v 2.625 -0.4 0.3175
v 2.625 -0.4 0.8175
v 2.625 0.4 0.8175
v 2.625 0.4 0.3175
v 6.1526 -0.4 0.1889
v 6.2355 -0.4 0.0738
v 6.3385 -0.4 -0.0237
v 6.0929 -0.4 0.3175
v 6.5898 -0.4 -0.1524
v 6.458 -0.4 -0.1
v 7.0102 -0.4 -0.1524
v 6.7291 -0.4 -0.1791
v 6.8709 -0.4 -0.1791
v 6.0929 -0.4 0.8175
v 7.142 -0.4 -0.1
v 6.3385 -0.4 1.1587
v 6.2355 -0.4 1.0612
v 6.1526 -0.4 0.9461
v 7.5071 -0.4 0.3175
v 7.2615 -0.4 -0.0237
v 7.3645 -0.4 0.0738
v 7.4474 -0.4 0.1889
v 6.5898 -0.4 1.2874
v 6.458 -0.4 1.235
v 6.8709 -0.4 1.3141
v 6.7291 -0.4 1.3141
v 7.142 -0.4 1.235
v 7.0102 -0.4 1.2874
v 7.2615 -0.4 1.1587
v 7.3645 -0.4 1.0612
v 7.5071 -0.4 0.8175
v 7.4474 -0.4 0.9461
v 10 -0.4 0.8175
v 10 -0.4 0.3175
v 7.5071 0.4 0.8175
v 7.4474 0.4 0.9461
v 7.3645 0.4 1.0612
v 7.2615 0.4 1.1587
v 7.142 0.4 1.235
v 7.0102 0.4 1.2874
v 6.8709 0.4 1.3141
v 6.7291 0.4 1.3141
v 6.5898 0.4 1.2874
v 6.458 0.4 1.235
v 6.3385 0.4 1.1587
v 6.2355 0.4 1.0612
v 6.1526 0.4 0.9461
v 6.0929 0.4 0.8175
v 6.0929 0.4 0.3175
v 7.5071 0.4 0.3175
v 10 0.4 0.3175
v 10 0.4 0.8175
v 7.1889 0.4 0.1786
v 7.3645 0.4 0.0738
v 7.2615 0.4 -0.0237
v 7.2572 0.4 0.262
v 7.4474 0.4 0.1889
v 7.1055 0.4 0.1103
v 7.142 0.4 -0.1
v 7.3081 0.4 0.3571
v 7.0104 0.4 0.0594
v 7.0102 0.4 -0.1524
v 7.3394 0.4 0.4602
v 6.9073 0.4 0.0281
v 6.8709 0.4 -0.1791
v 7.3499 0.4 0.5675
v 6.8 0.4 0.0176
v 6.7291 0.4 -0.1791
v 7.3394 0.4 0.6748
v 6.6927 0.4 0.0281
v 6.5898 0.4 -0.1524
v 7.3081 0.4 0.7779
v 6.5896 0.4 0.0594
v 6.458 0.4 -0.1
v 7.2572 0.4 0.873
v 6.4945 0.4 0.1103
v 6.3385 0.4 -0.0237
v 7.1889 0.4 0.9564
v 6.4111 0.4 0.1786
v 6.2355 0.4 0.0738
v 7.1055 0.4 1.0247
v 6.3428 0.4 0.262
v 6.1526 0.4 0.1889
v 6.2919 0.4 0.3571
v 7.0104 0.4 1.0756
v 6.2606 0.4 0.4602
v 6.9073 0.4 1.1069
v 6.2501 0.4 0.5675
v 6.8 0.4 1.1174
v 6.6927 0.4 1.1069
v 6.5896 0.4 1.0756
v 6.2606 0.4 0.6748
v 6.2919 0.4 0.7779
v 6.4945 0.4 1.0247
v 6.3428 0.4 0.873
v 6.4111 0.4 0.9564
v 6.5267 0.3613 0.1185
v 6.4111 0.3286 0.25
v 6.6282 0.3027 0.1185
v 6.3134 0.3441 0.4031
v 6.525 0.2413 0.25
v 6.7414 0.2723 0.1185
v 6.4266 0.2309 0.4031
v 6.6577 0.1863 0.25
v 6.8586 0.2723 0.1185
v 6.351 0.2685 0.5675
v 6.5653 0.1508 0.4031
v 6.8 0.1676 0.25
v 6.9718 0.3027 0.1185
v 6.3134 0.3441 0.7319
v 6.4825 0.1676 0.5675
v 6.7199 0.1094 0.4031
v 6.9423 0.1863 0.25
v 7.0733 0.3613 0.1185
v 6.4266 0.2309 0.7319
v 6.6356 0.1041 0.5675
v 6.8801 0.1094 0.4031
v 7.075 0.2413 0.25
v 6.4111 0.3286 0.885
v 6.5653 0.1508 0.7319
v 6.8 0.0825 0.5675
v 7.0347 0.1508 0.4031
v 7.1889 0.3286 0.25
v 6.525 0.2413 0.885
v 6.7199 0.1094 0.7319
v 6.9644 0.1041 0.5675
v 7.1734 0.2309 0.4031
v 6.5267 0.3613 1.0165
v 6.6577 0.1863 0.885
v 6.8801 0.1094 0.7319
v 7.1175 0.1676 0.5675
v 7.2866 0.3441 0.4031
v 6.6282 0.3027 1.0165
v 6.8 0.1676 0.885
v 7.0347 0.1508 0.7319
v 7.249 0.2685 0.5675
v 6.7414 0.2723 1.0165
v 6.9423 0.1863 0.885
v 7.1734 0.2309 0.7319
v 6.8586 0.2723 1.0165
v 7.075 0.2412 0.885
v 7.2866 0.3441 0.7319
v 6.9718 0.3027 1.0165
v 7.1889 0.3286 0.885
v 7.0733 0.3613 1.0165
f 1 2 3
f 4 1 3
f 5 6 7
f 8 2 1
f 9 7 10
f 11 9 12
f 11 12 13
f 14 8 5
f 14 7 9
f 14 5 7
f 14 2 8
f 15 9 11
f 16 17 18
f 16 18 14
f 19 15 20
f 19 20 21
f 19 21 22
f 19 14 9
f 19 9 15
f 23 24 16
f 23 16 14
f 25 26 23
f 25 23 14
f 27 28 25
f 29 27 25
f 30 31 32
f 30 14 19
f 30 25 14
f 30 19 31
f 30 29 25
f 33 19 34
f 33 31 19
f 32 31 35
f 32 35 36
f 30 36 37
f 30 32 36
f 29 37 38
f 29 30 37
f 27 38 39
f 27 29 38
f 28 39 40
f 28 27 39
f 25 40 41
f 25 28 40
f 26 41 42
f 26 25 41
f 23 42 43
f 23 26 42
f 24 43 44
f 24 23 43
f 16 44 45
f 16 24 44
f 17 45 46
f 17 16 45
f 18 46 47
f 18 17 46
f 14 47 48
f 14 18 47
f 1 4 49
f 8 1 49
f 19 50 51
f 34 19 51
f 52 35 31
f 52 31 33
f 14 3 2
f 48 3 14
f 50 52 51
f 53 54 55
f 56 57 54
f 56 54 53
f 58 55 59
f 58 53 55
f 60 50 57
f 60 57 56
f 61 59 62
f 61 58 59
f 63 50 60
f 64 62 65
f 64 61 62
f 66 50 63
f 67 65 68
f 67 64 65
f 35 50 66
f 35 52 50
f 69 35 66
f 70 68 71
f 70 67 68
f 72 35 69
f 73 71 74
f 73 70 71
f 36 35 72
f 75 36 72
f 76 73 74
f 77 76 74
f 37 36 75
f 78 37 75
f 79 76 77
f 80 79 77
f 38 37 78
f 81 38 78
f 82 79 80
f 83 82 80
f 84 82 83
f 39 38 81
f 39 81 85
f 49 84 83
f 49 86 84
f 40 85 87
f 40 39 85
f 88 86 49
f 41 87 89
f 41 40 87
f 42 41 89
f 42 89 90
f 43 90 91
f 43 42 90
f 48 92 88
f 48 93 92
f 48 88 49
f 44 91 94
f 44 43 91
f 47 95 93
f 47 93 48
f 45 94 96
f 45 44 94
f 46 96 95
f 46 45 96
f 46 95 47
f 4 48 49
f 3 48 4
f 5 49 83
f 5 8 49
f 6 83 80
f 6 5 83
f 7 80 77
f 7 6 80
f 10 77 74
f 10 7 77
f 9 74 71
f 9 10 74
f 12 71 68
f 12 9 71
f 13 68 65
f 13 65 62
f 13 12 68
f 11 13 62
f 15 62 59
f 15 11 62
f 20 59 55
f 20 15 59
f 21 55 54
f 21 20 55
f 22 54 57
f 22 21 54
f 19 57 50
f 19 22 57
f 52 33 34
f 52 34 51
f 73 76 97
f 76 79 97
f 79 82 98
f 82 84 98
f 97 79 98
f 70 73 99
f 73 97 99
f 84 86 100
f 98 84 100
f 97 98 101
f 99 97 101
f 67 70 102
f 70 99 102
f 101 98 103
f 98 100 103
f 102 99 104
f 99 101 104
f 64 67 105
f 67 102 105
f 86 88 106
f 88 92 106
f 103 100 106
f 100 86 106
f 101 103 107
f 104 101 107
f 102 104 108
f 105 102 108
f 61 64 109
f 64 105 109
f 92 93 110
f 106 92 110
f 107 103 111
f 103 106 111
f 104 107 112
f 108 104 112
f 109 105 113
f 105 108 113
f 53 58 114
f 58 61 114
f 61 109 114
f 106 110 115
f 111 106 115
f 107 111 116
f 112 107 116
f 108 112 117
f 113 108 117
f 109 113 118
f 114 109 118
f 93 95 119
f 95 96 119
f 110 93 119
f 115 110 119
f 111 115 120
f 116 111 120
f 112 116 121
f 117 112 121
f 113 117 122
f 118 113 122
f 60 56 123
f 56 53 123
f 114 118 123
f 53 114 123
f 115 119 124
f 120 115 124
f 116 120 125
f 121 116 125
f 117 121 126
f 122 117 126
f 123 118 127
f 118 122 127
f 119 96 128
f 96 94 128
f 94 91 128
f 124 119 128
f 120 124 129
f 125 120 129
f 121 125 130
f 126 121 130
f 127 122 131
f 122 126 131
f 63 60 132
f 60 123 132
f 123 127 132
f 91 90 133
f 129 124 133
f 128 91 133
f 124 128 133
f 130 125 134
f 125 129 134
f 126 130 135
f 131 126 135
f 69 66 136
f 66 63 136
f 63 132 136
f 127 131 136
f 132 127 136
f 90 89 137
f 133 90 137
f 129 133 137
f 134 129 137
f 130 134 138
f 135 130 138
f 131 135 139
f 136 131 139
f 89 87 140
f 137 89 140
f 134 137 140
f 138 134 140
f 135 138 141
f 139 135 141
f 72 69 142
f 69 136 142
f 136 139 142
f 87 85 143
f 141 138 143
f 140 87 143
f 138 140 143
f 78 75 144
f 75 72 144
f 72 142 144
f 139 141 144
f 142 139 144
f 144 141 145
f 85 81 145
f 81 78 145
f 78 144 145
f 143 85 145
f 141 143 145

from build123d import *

# Parameters (mm, degrees)
PAD_DEPTH    = 0.25
SKETCH001_R  = 0.75
PAD001_DEPTH = 0.25
SKETCH002_R  = 0.75
PAD002_DEPTH = 0.25
SKETCH003_R  = 0.75
PAD003_DEPTH = 0.25
SKETCH004_R  = 0.75
PAD004_DEPTH = 0.4
SKETCH005_W  = 20
SKETCH005_H  = 20
POCKET_DEPTH = 10.171606


with BuildPart() as part:
    # Sketch (on DatumPlane) → Pad (new body, symmetric)
    with BuildSketch(Plane.XY.offset(0.5675)):
        Polygon((-7.195606, 5), (-7.195606, 0), (-7.195606, -5), (-6.795606, -5), (-6.395606, -5), (-6.395606, -0.4), (10, -0.4), (10, 0.4), (-6.395606, 0.4), (-6.395606, 5), (-6.795606, 5), align=None)
    extrude(amount=PAD_DEPTH, both=True)

    # Sketch001 (on DatumPlane) → Pad001 (join, symmetric)
    with BuildSketch(Plane.XY.offset(0.5675)):
        Circle(SKETCH001_R)
    extrude(amount=PAD001_DEPTH, both=True)

    # Sketch002 (on DatumPlane) → Pad002 (join, symmetric)
    with BuildSketch(Plane.XY.offset(0.5675)):
        with Locations((-6.795606, 5)):
            Circle(SKETCH002_R)
    extrude(amount=PAD002_DEPTH, both=True)

    # Sketch003 (on DatumPlane) → Pad003 (join, symmetric)
    with BuildSketch(Plane.XY.offset(0.5675)):
        with Locations((-6.795606, -5)):
            Circle(SKETCH003_R)
    extrude(amount=PAD003_DEPTH, both=True)

    # Sphere → Sphere (revolve, cut)
    with BuildSketch(Plane.XZ):
        with BuildLine():
            ThreePointArc((0, -0.635), (0.635, 0), (0, 0.635))
            Line((0, 0.635), (0, -0.635))
        make_face()
    revolve(axis=Axis((0, 0, 0), (0, 0, 1)), mode=Mode.SUBTRACT)

    # Sphere001 → Sphere001 (revolve, cut)
    with BuildSketch(Plane(origin=(-6.795606, 5, 1.135), x_dir=(1, 0, 0), z_dir=(0, -1, 0))):
        with BuildLine():
            ThreePointArc((0, -0.635), (0.635, 0), (0, 0.635))
            Line((0, 0.635), (0, -0.635))
        make_face()
    revolve(axis=Axis((-6.795606, 5, 1.135), (0, 0, 1)), mode=Mode.SUBTRACT)

    # Sphere002 → Sphere002 (revolve, cut)
    with BuildSketch(Plane(origin=(-6.795606, -5, 1.135), x_dir=(1, 0, 0), z_dir=(0, -1, 0))):
        with BuildLine():
            ThreePointArc((0, -0.635), (0.635, 0), (0, 0.635))
            Line((0, 0.635), (0, -0.635))
        make_face()
    revolve(axis=Axis((-6.795606, -5, 1.135), (0, 0, 1)), mode=Mode.SUBTRACT)

    # Sketch004 (on DatumPlane) → Pad004 (join, symmetric)
    with BuildSketch(Plane(origin=(0, 0, 0.5675), x_dir=(1, 0, 0), z_dir=(0, -1, 0))):
        with Locations((6.8, 0)):
            Circle(SKETCH004_R)
    extrude(amount=PAD004_DEPTH, both=True)

    # Sphere003 → Sphere003 (revolve, cut)
    with BuildSketch(Plane(origin=(6.8, 0.7175, 0.5675), x_dir=(1, 0, 0), z_dir=(0, -1, 0))):
        with BuildLine():
            ThreePointArc((0, -0.635), (0.635, 0), (0, 0.635))
            Line((0, 0.635), (0, -0.635))
        make_face()
    revolve(axis=Axis((6.8, 0.7175, 0.5675), (0, 0, 1)), mode=Mode.SUBTRACT)

    # Sketch005 (on DatumPlane) → Pocket (cut, through all)
    with BuildSketch(Plane.YZ.offset(2.625)):
        Rectangle(SKETCH005_W, SKETCH005_H)
    extrude(amount=-POCKET_DEPTH, mode=Mode.SUBTRACT)


solid = part.part
